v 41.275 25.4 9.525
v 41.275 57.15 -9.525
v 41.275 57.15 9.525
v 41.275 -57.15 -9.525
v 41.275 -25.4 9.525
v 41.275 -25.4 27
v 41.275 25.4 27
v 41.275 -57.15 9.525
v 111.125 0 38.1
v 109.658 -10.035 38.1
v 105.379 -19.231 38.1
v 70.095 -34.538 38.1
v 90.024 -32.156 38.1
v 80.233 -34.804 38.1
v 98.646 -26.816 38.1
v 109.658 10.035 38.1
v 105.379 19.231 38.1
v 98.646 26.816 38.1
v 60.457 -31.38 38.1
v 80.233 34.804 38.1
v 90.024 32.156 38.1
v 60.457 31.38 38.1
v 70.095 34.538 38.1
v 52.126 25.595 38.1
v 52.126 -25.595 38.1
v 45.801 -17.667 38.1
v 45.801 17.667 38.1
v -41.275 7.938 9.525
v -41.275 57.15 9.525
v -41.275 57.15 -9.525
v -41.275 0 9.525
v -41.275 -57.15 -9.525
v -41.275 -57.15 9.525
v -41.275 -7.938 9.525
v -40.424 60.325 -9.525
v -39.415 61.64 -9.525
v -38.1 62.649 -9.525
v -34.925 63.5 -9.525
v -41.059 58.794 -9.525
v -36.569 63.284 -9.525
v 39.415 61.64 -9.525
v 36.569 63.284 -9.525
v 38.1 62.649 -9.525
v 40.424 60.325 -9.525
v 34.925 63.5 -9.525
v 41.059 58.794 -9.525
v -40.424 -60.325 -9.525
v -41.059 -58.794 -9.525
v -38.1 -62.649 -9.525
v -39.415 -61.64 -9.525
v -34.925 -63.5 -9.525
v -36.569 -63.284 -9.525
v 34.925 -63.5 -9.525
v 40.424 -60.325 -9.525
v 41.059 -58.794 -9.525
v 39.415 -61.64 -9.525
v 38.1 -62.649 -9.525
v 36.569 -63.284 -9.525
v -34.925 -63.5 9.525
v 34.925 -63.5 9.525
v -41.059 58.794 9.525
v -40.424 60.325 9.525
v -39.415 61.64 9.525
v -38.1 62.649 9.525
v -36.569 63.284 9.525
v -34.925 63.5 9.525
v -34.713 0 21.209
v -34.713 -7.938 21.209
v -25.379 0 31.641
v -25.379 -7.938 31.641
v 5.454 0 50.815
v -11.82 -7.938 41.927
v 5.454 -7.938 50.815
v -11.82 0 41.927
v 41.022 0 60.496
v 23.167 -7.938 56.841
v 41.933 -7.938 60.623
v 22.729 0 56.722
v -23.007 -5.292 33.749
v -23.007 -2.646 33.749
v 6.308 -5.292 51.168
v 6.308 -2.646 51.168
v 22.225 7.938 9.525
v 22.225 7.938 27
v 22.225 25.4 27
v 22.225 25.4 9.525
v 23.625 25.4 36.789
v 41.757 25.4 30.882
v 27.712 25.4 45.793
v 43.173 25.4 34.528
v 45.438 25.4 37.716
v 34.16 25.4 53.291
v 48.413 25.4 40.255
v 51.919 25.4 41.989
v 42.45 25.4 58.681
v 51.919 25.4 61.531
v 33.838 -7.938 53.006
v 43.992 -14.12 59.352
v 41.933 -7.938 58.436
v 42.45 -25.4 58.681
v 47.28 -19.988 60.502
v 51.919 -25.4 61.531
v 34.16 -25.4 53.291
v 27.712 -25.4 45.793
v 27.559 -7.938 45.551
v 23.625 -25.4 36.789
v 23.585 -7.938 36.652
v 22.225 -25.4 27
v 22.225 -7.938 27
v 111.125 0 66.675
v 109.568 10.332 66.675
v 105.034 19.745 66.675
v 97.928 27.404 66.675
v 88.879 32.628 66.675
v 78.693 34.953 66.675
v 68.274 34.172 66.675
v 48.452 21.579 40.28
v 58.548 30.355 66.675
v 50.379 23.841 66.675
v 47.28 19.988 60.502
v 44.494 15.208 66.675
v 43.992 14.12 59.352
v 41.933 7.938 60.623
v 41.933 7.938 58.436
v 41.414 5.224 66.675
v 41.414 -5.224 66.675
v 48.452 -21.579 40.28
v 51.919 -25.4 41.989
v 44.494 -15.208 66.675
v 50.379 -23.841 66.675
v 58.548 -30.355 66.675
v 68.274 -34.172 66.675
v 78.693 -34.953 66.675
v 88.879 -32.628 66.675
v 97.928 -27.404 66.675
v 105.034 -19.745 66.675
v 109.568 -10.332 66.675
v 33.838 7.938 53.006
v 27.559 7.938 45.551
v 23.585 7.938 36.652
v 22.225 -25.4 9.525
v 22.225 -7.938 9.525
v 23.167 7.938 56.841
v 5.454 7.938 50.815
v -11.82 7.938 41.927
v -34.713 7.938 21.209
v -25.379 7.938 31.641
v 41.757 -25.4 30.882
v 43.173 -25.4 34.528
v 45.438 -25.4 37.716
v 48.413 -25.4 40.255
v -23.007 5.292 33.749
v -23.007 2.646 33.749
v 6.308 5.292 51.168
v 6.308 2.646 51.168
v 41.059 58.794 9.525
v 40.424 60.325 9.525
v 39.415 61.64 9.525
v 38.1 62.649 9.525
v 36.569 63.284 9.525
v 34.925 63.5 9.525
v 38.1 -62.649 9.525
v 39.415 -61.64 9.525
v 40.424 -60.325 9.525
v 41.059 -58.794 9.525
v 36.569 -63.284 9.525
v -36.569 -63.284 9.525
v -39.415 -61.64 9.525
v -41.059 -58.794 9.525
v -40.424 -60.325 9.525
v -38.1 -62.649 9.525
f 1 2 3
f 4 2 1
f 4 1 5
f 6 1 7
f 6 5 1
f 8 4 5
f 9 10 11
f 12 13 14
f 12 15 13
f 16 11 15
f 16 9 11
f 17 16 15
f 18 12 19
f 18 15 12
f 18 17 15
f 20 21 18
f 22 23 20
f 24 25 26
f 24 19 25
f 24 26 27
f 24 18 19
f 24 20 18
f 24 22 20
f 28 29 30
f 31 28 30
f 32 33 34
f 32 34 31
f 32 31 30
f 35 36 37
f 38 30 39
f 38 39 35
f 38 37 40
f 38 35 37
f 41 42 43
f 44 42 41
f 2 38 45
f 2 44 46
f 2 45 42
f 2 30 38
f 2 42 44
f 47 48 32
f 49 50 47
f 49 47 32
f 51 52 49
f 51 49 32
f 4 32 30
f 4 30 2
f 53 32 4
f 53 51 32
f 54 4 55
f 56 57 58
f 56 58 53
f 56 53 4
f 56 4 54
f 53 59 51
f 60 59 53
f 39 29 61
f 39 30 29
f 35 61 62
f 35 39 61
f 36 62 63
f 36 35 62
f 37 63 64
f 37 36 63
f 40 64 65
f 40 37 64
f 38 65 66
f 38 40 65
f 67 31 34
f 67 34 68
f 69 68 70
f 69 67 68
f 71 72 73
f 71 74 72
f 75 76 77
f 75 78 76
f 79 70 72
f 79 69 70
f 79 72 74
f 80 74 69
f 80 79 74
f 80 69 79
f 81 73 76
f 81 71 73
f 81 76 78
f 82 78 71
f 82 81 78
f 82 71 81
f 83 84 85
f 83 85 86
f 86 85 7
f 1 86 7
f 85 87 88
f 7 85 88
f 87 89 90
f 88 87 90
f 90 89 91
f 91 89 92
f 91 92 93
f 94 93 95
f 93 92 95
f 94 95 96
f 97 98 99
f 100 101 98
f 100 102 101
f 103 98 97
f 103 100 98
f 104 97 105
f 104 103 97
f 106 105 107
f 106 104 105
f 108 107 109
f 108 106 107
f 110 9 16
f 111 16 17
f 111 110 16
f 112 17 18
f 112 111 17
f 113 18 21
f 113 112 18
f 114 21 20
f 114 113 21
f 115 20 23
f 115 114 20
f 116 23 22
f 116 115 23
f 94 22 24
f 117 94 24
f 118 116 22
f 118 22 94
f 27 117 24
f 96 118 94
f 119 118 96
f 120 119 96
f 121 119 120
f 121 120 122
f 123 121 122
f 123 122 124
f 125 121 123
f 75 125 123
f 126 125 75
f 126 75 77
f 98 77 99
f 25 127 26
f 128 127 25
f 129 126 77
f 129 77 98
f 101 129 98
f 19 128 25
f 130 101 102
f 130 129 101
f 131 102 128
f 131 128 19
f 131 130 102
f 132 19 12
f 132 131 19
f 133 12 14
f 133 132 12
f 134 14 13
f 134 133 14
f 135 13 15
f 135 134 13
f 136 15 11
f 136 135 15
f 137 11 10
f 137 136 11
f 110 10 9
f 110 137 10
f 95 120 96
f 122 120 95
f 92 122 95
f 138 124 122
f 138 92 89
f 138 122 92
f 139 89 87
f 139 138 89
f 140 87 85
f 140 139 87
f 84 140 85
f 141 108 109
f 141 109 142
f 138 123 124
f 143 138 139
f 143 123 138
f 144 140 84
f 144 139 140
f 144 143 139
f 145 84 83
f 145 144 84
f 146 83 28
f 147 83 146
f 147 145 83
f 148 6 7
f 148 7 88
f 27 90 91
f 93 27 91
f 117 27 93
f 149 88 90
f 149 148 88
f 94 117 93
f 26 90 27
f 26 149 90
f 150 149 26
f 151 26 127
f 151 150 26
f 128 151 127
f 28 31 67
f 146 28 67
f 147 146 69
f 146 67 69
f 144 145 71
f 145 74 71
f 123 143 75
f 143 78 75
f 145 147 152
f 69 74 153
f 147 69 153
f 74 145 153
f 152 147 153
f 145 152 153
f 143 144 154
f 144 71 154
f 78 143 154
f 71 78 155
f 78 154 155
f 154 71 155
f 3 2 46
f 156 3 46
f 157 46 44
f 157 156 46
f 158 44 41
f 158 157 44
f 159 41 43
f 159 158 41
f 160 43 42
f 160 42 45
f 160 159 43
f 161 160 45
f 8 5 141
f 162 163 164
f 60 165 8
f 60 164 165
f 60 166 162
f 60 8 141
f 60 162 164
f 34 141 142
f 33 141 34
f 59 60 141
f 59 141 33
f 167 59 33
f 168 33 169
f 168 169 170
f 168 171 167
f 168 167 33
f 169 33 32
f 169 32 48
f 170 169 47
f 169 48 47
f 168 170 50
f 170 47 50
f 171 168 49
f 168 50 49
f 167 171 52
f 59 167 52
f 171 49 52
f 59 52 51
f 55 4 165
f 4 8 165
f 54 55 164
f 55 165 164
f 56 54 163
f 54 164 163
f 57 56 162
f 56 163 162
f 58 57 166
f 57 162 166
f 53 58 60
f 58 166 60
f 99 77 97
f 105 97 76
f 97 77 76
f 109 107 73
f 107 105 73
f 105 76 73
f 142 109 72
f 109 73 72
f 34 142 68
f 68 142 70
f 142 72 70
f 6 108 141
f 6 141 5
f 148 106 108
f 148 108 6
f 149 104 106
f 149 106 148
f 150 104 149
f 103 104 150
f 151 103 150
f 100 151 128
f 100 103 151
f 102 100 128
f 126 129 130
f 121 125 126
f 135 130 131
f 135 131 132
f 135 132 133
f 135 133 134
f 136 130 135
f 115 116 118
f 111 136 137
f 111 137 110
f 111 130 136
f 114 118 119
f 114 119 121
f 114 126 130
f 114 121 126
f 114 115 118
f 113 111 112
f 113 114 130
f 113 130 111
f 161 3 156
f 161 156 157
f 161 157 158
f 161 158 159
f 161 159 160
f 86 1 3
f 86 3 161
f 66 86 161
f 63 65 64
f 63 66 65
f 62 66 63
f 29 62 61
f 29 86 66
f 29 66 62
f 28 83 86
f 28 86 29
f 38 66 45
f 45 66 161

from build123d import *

# Parameters (mm, degrees)
F1_DEPTH = 63.5
F0_W     = 15.748692
F0_H     = 4.7752
F2_DEPTH = 25.4
F3_DEPTH = 7.9375
F5_R     = 6.35


with BuildPart() as f1:
    # F0 (on Front) → F1 (new body, symmetric)
    with BuildSketch(Plane.XZ):
        Polygon((-41.275, 9.525), (-41.275, -9.525), (41.275, -9.525), (41.275, 9.525), (22.225, 9.525), align=None)
    extrude(amount=F1_DEPTH, both=True)

    # F0 (on Front) → F2 (join, symmetric)
    with BuildSketch(Plane.XZ):
        with Locations((68.199346, 40.4876)):
            Rectangle(F0_W, F0_H)
        with BuildLine():
            Line((22.225, 9.525), (41.275, 9.525))
            Line((41.275, 9.525), (41.275, 27.0002))
            ThreePointArc((41.275, 27.0002), (45.92468, 38.22552), (57.15, 42.8752))
            Line((57.15, 42.8752), (60.325, 42.8752))
            Line((60.325, 42.8752), (60.325, 61.9252))
            Line((60.325, 61.9252), (57.15, 61.9252))
            add(Edge.make_bspline(
                [(54.028564, 61.78543), (55.069144, 61.843048), (56.109775, 61.889675), (57.15, 61.9252)],
                knots=[108.777413, 108.777413, 108.777413, 108.777413, 111.504536, 111.504536, 111.504536, 111.504536], degree=3))
            ThreePointArc((54.028564, 61.78543), (31.374316, 50.566484), (22.225, 27.0002))
            Line((22.225, 27.0002), (22.225, 9.525))
        make_face()
    extrude(amount=F2_DEPTH, both=True)

    # F0 (on Front) → F3 (join, symmetric)
    with BuildSketch(Plane.XZ):
        with BuildLine():
            add(Edge.make_bspline(
                [(-41.275, 9.525), (-28.903485, 39.703747), (12.522665, 59.487237), (54.028564, 61.78543)],
                knots=[0, 0, 0, 0, 108.777413, 108.777413, 108.777413, 108.777413], degree=3))
            Line((-41.275, 9.525), (22.225, 9.525))
            Line((22.225, 9.525), (22.225, 27.0002))
            ThreePointArc((22.225, 27.0002), (31.374316, 50.566484), (54.028564, 61.78543))
        make_face()
    extrude(amount=F3_DEPTH, both=True)

    # F0 (on Front) → F4 (revolve)
    with BuildSketch(Plane.XZ):
        Polygon((76.073692, 66.675), (76.073692, 61.9252), (76.073692, 42.8752), (76.073692, 38.1), (111.125, 38.1), (111.125, 66.675), align=None)
    revolve(axis=Axis((76.073692, 0, 52.4002), (0, 0, 1)))

    # F5
    f5_edges = [f1.edges().sort_by_distance(p)[0] for p in [
        (41.275, -63.5, 0),
        (-41.275, -63.5, 0),
        (-41.275, 63.5, 0),
        (41.275, 63.5, 0),
    ]]
    fillet(f5_edges, radius=F5_R)


solid = f1.part
